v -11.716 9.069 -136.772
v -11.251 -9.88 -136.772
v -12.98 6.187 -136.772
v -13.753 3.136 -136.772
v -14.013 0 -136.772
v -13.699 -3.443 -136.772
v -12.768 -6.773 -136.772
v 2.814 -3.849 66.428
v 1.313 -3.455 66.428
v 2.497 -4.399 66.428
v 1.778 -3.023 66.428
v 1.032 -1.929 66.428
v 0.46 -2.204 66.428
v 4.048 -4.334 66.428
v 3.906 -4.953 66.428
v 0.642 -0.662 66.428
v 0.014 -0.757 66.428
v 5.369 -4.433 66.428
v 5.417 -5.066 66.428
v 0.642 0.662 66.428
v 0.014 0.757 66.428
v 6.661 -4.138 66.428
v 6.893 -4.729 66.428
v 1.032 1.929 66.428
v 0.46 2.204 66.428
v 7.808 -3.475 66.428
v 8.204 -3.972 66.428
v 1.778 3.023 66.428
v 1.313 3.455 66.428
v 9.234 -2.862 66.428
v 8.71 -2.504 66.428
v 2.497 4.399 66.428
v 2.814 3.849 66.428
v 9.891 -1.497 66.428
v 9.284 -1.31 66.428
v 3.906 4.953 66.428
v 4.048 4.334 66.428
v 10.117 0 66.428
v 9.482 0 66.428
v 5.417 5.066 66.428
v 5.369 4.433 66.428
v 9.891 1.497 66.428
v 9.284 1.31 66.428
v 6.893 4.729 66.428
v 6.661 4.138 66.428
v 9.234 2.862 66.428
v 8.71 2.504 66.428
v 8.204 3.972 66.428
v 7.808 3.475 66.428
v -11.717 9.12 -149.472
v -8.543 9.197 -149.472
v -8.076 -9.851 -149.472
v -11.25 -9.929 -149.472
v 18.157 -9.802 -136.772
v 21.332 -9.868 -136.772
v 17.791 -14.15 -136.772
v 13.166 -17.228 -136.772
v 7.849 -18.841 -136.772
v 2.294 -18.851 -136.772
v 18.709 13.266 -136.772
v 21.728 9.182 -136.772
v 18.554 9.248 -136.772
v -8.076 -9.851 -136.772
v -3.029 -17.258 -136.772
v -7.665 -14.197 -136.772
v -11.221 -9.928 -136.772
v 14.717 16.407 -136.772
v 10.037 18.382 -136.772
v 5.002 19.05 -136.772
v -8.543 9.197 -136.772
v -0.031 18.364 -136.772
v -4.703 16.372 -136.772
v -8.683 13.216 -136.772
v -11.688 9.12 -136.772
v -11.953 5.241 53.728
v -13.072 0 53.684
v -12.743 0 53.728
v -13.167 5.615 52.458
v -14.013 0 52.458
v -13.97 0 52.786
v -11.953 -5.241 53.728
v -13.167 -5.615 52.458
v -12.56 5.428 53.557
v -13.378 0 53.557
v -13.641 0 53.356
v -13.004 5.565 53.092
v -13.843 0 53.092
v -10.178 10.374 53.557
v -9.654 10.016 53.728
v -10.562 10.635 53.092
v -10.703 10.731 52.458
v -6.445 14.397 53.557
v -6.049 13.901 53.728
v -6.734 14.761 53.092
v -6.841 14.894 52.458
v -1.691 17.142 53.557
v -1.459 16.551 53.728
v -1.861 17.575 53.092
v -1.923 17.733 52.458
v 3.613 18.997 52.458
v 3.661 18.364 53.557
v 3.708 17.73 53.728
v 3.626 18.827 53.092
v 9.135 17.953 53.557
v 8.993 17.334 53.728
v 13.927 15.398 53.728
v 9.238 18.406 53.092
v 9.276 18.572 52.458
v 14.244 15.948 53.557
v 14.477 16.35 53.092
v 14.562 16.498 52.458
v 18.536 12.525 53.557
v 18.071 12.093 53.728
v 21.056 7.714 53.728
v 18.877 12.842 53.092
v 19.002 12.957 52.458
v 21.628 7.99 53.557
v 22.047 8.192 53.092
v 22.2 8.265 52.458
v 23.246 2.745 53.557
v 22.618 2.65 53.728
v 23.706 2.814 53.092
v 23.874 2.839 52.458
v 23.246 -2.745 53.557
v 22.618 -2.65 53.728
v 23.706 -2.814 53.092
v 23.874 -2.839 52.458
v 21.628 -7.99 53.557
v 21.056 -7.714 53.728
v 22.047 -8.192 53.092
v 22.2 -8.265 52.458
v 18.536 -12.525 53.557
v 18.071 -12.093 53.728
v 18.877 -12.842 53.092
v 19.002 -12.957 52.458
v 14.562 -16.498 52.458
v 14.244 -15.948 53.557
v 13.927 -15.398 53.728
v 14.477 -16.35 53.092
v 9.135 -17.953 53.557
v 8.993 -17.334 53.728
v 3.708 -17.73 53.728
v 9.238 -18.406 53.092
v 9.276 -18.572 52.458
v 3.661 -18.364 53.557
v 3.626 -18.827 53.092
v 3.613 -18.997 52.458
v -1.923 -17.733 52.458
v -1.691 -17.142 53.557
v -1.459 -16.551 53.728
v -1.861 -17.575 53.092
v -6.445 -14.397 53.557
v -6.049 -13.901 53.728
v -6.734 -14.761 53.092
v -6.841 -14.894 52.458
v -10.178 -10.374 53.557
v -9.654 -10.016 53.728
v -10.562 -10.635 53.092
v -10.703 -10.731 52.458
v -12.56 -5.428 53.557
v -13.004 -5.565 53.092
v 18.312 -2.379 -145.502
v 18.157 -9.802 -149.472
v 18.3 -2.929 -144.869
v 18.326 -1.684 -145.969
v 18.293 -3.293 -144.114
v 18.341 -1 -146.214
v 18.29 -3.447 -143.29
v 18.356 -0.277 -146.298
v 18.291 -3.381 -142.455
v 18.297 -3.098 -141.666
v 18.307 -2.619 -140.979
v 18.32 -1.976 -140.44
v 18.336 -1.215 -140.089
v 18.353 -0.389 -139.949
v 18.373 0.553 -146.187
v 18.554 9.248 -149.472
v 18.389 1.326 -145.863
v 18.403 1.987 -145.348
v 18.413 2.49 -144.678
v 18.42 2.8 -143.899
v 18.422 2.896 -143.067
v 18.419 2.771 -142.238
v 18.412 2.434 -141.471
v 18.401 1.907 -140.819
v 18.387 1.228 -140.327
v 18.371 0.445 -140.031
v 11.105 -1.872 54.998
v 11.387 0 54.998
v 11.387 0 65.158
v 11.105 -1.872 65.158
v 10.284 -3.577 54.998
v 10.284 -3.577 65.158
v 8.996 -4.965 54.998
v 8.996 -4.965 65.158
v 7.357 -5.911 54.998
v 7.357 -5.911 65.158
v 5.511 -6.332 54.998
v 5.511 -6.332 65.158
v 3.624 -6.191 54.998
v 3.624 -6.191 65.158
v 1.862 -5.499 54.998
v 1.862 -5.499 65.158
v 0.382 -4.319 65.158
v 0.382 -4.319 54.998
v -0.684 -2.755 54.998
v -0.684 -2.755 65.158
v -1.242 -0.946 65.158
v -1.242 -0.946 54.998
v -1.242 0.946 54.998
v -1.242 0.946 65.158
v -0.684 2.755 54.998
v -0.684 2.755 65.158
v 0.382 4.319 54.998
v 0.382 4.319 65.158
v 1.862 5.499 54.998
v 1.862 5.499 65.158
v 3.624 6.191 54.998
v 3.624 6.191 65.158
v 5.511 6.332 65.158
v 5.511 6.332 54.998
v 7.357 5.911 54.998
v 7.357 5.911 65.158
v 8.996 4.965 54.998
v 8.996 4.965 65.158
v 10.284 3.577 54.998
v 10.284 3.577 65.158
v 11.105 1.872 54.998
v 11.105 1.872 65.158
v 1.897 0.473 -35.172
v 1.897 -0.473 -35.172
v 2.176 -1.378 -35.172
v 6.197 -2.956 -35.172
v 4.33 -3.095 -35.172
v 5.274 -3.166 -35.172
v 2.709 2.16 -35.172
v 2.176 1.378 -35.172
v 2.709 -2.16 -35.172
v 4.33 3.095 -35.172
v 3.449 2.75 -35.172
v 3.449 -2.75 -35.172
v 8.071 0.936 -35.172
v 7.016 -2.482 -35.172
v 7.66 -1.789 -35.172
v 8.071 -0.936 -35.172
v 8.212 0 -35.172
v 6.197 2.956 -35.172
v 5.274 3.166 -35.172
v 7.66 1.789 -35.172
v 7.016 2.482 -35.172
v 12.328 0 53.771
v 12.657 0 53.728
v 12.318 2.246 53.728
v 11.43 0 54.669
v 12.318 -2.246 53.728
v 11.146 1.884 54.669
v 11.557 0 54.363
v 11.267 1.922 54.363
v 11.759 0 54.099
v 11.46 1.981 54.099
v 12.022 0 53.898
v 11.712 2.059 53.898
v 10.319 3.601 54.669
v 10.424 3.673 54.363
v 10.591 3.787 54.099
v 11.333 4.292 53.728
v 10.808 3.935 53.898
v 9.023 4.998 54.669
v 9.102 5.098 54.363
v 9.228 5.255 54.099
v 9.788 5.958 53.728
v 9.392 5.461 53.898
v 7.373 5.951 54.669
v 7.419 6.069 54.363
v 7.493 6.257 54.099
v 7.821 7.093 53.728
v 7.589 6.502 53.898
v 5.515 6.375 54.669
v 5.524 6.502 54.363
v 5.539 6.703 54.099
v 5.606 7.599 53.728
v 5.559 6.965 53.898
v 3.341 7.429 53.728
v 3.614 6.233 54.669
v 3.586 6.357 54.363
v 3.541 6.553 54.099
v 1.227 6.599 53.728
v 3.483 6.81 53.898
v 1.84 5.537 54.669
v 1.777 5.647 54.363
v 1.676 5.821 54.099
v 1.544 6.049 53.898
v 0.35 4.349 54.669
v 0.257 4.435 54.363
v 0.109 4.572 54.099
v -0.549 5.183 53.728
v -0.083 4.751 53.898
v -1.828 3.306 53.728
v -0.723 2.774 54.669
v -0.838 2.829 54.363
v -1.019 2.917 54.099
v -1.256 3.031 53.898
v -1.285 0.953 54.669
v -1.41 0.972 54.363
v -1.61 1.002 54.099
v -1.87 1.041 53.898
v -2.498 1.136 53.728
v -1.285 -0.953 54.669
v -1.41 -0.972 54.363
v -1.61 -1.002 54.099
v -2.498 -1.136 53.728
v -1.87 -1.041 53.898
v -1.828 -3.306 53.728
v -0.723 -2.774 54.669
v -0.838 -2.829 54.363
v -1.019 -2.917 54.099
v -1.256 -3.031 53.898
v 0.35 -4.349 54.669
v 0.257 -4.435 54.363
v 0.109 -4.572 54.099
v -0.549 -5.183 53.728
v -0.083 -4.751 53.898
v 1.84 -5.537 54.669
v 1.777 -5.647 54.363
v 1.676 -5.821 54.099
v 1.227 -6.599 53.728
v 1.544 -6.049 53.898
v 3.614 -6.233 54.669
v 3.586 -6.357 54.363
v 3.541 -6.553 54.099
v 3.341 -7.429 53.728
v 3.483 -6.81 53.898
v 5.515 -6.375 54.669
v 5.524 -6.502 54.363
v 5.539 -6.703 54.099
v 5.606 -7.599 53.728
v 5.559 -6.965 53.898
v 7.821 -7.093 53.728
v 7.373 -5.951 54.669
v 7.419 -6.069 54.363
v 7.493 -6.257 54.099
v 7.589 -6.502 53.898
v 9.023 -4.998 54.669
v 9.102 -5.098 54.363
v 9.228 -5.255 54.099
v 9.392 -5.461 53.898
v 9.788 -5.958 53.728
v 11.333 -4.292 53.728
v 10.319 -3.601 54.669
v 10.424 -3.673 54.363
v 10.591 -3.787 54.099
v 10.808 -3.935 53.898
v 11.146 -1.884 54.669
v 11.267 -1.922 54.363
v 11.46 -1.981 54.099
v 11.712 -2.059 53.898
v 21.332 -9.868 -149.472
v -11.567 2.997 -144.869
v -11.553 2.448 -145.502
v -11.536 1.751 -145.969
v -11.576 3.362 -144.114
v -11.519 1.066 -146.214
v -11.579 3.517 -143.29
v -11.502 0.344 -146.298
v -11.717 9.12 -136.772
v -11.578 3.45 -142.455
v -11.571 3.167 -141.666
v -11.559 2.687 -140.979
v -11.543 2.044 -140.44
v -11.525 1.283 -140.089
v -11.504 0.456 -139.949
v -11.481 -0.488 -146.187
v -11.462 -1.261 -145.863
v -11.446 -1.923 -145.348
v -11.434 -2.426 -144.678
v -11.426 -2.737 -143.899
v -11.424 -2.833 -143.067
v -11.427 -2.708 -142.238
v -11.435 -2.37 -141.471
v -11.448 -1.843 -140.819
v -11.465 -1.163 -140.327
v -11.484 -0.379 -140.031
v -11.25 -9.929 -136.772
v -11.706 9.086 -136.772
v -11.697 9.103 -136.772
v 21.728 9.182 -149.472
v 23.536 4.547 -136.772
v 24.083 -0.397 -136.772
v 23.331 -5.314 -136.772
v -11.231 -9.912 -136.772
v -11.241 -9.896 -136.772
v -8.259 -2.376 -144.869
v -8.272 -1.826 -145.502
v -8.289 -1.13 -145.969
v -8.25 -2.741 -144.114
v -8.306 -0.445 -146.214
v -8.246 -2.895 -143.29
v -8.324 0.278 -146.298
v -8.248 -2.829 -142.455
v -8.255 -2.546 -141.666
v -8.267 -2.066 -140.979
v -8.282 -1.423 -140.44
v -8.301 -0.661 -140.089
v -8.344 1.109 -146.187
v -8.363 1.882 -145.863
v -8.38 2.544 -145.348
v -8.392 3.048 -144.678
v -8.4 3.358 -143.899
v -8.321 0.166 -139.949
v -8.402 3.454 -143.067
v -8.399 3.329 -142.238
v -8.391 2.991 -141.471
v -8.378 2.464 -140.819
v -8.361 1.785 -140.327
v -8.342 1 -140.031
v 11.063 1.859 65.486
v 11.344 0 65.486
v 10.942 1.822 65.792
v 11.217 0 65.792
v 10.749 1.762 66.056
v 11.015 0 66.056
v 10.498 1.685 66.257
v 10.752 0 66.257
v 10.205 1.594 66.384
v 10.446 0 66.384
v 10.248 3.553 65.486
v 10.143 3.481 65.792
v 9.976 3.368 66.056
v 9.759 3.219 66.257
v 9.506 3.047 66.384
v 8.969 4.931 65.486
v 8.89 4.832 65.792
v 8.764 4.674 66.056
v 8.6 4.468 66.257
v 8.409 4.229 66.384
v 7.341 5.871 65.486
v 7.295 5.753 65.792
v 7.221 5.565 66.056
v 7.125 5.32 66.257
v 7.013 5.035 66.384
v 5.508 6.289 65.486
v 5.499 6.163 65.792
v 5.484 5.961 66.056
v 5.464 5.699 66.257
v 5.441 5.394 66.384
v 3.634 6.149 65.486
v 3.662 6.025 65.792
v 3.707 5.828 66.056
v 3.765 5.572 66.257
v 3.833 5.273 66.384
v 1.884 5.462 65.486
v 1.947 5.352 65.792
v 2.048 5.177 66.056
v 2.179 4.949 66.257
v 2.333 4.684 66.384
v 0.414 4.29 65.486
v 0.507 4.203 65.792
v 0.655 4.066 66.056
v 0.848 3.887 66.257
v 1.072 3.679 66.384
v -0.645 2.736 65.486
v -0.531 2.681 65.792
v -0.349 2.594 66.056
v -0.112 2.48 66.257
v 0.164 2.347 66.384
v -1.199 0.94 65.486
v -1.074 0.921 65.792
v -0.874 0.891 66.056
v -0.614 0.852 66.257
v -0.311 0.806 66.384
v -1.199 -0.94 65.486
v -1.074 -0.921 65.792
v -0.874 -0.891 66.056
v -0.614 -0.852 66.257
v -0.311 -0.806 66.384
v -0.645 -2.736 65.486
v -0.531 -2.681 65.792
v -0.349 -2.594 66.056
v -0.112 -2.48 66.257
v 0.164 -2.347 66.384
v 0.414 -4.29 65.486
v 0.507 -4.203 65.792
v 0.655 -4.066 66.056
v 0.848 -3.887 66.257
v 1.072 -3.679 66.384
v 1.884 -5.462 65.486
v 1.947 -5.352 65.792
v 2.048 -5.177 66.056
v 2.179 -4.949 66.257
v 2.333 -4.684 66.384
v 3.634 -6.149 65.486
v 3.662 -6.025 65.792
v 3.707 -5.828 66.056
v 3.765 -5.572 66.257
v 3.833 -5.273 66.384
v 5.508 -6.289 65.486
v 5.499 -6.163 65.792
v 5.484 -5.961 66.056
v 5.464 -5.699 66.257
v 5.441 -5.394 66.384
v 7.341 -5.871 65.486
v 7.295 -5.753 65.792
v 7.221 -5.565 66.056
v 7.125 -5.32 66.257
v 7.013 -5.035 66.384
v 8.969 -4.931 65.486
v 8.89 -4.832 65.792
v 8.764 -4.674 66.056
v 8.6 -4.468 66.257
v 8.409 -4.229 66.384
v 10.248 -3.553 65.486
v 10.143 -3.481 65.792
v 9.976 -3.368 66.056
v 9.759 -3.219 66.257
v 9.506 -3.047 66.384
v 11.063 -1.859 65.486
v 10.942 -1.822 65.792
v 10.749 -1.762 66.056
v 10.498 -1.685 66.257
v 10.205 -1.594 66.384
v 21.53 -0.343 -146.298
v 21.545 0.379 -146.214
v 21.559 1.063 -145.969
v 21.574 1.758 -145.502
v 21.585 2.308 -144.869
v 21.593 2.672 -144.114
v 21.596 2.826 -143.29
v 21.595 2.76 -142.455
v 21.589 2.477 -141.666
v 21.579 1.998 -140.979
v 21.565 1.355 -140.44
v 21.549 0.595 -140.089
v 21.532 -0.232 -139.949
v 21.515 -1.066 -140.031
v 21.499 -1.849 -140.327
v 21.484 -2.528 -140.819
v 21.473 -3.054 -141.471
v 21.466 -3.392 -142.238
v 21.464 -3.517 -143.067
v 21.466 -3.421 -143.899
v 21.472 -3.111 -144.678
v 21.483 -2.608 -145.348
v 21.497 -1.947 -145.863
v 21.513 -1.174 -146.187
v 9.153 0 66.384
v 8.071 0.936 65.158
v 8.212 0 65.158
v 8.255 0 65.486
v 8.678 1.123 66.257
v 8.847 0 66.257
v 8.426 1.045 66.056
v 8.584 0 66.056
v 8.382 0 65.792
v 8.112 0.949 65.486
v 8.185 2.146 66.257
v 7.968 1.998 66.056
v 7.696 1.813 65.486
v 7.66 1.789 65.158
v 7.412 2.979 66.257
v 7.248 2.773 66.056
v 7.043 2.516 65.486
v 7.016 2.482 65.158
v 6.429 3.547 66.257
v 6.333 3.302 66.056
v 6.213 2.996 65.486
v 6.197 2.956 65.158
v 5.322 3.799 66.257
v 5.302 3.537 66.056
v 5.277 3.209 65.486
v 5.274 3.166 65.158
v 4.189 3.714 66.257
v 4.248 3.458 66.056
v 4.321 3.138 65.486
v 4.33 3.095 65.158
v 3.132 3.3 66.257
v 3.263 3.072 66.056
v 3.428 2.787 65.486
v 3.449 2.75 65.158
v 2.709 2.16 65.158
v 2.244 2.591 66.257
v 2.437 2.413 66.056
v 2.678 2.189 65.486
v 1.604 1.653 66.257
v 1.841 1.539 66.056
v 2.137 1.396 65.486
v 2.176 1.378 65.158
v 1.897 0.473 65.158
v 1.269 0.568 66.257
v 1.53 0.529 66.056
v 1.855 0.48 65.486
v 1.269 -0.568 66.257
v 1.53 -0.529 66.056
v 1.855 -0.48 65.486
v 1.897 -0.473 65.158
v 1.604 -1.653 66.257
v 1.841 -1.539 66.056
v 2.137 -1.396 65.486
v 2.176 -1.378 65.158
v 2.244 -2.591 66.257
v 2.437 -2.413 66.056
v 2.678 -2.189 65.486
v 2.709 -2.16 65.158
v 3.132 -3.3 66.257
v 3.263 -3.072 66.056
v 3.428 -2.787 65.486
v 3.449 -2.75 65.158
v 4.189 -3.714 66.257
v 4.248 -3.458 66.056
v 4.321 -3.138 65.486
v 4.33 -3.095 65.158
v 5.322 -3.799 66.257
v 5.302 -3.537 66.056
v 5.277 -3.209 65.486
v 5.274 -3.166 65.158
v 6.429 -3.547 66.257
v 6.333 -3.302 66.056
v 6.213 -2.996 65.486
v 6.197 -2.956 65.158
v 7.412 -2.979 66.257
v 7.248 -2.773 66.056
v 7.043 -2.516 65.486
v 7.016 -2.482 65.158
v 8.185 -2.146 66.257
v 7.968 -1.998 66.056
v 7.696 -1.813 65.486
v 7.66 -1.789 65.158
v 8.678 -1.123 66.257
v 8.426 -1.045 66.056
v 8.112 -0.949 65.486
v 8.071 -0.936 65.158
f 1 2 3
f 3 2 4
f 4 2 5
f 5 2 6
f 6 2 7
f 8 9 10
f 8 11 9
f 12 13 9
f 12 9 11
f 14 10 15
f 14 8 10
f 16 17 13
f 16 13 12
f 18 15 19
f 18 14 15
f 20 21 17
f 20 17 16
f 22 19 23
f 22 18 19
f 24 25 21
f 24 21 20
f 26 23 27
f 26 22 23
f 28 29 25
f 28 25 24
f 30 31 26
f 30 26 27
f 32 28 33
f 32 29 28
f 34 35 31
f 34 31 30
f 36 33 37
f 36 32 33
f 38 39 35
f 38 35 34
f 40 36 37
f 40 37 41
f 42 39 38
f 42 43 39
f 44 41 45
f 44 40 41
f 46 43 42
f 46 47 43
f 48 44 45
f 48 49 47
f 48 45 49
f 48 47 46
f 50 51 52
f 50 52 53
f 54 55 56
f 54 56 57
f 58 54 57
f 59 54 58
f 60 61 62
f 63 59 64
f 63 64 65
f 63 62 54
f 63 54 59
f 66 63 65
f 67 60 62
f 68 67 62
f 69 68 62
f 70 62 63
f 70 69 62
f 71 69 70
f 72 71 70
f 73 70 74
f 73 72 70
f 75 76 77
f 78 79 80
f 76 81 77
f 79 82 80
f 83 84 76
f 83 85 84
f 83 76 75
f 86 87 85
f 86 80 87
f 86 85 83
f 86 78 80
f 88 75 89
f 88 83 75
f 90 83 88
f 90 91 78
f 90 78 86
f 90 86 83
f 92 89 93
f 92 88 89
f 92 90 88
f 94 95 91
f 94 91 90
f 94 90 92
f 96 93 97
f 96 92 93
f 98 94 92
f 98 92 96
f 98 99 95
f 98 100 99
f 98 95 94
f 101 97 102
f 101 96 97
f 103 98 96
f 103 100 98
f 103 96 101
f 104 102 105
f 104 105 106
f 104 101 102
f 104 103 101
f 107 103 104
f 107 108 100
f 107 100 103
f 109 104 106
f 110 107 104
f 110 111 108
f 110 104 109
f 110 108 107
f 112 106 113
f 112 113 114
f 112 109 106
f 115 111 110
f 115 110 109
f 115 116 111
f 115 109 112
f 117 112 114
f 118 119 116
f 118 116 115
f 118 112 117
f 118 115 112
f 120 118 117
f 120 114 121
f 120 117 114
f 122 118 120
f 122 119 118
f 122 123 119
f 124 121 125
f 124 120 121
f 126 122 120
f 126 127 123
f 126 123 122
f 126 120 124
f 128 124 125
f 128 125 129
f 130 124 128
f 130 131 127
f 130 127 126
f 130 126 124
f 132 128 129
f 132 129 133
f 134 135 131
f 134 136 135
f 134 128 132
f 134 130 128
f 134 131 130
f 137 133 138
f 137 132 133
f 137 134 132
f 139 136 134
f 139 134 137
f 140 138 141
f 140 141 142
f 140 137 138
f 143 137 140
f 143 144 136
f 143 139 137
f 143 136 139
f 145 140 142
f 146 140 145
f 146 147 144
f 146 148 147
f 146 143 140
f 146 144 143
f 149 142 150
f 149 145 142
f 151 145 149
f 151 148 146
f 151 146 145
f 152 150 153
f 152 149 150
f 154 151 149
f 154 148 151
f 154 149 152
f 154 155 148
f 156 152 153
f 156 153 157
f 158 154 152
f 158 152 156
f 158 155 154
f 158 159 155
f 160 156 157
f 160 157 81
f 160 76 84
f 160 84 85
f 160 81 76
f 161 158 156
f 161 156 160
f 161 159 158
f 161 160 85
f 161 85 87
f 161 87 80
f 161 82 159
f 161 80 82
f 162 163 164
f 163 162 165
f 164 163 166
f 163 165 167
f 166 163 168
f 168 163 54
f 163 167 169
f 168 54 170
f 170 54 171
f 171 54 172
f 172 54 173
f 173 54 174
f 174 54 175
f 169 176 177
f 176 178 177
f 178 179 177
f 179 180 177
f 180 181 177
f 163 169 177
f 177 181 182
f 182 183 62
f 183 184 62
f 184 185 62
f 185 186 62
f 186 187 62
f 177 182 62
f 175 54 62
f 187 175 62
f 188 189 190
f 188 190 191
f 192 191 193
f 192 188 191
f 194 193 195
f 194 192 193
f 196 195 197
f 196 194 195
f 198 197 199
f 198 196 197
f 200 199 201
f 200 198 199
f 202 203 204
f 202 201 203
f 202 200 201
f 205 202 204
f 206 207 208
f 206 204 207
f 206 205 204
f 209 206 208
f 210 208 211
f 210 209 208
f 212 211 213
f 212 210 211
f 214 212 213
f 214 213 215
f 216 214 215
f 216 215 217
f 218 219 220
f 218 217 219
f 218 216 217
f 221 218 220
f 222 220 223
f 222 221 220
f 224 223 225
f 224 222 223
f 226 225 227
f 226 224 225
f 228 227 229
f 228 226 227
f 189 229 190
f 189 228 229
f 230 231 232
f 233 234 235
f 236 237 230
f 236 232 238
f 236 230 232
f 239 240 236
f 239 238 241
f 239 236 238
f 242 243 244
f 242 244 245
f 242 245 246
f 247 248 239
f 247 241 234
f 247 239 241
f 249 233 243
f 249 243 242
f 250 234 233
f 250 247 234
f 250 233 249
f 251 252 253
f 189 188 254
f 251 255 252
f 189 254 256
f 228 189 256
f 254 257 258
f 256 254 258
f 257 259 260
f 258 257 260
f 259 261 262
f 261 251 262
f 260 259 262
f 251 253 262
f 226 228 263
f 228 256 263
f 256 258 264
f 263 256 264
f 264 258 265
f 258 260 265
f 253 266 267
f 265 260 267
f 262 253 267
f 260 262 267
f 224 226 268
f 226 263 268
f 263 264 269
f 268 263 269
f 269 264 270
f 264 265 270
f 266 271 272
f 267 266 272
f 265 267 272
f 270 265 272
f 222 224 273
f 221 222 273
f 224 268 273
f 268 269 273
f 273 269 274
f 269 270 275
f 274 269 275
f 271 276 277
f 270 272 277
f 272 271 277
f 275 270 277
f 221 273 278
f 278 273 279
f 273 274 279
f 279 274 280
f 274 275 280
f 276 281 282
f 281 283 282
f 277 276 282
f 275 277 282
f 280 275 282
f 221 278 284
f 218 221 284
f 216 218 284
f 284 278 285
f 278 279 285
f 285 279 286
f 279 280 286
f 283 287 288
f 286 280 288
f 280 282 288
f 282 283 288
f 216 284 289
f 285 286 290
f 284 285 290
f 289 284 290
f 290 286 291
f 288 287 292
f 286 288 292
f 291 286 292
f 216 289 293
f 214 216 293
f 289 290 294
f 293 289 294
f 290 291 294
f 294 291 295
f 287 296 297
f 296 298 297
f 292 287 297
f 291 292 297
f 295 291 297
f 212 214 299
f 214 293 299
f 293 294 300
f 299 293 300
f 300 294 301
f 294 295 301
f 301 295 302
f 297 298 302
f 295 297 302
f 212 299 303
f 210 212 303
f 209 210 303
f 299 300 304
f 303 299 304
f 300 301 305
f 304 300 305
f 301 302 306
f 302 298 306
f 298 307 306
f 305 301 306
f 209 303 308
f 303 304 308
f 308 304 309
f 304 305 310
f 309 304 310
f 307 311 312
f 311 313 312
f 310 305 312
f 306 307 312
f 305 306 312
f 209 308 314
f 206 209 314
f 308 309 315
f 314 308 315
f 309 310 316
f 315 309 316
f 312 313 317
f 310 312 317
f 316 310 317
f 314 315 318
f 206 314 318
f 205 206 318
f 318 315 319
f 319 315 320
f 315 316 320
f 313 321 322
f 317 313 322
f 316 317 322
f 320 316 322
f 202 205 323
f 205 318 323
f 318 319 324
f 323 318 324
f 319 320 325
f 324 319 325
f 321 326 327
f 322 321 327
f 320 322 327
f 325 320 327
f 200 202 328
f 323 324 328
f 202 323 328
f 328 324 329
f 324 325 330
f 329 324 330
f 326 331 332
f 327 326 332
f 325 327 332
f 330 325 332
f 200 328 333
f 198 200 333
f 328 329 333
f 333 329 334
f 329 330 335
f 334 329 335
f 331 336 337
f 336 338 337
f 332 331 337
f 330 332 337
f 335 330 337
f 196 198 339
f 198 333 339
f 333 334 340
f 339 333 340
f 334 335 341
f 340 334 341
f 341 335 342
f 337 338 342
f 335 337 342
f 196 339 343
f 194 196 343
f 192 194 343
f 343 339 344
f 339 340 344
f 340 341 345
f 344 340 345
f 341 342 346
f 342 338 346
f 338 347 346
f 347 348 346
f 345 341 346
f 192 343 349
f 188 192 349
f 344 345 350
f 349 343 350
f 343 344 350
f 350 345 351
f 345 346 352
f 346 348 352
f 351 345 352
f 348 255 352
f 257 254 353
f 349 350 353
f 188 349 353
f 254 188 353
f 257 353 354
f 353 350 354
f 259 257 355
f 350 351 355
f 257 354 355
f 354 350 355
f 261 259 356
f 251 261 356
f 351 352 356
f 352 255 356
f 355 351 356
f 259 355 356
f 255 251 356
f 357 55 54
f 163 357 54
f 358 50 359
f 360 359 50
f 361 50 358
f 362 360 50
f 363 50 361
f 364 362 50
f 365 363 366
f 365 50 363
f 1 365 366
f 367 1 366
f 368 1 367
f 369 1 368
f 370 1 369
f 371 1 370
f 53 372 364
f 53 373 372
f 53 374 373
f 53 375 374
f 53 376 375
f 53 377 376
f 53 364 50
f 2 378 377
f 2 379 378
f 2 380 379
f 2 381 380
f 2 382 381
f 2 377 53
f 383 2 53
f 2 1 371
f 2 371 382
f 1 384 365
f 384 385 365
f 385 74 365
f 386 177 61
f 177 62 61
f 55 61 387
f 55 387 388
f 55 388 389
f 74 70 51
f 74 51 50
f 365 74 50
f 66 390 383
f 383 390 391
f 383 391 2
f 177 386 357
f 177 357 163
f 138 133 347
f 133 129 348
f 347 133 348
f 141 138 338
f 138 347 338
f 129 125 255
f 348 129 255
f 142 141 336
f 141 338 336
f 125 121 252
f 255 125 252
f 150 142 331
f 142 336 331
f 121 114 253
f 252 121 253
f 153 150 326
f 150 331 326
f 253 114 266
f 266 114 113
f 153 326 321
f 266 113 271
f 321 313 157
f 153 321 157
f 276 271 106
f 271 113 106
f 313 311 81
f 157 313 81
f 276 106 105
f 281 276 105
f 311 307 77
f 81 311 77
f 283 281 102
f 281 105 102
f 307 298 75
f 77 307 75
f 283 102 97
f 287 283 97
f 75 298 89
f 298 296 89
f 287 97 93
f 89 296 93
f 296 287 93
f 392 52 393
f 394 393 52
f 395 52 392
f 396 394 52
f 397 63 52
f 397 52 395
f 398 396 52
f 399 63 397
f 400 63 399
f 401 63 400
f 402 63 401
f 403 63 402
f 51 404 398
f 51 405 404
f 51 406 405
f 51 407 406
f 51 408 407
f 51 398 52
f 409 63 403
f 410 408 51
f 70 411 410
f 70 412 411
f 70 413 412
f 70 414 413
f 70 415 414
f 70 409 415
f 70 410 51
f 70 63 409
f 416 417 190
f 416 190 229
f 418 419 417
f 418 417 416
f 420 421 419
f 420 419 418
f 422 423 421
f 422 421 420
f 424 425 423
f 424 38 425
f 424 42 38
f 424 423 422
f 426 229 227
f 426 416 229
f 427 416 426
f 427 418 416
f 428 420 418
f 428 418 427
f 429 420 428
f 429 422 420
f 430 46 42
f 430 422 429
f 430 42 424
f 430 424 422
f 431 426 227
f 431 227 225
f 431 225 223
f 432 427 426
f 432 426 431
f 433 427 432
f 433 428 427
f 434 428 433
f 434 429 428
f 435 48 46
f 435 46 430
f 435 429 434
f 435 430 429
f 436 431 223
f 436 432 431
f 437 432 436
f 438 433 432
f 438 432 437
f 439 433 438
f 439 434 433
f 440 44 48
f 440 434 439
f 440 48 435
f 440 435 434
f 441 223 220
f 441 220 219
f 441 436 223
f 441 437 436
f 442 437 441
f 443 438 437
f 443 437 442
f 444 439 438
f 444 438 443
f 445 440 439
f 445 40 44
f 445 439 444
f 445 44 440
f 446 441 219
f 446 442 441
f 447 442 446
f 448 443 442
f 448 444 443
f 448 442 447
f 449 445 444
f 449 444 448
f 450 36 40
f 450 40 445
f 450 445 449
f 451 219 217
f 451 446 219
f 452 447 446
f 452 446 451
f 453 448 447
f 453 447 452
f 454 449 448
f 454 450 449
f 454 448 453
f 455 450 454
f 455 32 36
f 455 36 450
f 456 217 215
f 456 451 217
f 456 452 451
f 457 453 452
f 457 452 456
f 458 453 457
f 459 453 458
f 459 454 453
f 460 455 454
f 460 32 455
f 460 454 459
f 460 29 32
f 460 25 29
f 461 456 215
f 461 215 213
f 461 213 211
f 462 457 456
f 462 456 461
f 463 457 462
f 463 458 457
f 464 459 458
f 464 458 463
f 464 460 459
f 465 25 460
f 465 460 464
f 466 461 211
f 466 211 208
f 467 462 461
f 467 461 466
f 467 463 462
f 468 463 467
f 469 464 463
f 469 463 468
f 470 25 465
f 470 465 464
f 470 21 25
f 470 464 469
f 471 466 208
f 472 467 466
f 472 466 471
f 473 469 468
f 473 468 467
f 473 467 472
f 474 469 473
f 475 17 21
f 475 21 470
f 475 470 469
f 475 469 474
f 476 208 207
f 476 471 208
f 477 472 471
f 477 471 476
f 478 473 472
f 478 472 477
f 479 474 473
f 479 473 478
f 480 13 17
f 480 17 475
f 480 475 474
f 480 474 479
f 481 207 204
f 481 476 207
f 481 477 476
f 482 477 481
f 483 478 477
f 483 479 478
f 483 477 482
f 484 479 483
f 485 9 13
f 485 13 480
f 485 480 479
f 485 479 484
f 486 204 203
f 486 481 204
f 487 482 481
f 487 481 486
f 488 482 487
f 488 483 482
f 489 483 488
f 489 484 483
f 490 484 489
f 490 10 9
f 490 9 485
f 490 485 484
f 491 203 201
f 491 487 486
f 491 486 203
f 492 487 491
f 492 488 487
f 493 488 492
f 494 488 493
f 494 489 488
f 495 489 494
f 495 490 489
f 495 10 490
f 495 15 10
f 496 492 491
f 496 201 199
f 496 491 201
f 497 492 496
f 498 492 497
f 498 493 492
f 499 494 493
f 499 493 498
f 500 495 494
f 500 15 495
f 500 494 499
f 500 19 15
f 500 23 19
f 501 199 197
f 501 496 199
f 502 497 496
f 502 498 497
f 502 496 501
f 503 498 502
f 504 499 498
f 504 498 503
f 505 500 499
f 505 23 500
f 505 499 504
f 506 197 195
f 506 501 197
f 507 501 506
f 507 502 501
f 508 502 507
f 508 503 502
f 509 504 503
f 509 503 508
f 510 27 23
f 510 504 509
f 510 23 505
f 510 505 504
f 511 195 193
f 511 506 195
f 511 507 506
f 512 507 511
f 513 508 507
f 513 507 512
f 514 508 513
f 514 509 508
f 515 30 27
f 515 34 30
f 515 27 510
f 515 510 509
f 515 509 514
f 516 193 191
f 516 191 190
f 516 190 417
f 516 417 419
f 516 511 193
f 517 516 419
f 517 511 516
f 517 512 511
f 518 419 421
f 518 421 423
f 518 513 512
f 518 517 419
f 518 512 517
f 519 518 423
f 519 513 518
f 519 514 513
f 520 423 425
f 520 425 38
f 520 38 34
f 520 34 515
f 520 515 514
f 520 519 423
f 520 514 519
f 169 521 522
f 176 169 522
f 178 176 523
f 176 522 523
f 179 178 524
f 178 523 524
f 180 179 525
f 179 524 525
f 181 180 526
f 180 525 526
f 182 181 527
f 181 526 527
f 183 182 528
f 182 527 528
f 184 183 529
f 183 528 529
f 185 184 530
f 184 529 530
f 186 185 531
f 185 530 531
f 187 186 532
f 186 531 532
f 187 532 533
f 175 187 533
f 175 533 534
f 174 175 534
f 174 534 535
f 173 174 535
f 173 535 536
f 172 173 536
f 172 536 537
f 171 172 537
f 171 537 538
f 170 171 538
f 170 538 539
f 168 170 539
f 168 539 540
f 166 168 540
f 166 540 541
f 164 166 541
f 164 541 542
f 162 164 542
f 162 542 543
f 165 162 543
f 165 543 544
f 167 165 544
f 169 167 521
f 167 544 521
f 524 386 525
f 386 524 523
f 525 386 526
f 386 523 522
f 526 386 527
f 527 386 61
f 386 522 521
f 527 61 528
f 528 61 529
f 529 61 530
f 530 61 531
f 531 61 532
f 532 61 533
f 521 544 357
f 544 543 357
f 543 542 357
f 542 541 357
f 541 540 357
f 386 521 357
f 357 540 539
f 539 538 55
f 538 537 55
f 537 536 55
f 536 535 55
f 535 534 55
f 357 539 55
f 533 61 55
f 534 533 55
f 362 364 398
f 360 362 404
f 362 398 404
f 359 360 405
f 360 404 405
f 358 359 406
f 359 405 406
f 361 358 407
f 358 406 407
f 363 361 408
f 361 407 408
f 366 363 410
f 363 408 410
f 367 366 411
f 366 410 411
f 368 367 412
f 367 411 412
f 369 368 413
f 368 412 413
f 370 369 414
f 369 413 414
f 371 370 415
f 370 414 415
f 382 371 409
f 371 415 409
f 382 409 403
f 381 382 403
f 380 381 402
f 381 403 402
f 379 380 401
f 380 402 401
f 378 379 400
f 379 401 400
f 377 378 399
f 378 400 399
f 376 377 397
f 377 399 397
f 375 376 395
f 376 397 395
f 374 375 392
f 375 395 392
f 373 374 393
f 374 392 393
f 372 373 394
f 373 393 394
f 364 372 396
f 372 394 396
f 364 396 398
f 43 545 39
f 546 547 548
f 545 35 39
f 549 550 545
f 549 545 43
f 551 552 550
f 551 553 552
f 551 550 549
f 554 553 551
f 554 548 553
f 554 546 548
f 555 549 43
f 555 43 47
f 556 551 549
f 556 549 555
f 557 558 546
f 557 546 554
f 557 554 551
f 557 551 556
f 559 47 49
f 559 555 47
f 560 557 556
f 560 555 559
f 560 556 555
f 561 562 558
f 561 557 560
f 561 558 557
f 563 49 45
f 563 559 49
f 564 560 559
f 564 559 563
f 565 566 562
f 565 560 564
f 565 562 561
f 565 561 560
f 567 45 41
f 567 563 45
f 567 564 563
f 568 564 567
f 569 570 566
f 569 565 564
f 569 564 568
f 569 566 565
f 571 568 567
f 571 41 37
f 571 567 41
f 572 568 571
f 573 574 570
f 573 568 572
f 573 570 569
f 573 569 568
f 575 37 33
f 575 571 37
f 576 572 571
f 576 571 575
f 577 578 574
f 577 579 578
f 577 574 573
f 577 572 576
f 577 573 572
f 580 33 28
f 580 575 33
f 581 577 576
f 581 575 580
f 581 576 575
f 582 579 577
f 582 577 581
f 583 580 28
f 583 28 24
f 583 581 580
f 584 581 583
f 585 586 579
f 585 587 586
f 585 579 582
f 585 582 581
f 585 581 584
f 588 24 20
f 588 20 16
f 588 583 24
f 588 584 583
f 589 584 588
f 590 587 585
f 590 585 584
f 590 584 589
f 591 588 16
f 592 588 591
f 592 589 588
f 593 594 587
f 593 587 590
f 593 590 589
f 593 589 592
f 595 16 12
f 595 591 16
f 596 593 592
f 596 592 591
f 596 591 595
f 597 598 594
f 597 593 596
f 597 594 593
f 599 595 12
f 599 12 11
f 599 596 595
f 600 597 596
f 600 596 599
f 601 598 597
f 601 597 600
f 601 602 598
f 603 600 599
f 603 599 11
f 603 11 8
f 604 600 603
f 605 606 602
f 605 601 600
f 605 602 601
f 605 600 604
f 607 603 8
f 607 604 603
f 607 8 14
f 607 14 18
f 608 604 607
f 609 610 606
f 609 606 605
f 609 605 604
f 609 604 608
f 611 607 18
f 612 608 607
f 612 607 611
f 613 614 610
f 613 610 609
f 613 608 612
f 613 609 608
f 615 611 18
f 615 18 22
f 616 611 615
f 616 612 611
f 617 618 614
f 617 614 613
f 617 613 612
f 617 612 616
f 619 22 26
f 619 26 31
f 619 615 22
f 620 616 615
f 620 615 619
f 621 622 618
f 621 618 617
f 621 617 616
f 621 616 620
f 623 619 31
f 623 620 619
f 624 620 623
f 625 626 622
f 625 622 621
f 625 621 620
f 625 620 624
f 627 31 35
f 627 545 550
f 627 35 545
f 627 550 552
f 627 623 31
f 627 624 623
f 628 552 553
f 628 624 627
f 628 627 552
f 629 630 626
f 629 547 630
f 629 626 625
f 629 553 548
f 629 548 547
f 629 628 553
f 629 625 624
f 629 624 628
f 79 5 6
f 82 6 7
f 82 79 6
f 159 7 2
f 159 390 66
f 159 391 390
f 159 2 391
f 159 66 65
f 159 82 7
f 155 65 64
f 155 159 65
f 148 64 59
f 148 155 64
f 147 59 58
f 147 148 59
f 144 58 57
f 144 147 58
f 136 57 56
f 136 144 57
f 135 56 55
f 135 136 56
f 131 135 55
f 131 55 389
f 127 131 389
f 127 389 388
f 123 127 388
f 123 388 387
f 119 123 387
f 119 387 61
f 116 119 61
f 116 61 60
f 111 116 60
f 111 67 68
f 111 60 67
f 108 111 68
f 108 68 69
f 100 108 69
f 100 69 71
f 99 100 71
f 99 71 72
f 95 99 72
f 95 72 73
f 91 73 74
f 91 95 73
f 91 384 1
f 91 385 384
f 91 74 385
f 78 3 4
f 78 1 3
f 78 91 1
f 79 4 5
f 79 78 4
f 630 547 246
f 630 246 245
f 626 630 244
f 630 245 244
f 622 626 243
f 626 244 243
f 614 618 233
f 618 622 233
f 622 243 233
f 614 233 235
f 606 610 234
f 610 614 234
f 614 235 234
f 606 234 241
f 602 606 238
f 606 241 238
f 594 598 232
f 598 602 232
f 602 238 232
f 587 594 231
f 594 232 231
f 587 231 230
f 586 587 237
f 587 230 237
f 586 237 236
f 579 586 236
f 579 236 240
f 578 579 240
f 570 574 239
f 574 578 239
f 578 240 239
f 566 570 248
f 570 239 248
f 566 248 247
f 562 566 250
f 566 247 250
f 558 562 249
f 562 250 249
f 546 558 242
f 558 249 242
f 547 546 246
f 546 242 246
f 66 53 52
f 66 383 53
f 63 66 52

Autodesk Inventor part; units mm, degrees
ref_plane "YZ Plane" through (0, 0, 0) normal (1, 0, 0) x (0, 1, 0)
ref_plane "XZ Plane" through (0, 0, 0) normal (0, 1, 0) x (-1, 0, 0)
ref_plane "XY Plane" through (0, 0, 0) normal (0, 0, 1) x (1, 0, 0)
sketch "Sketch1" plane through (0, 0, 0) normal (0, 1, 0) x (-1, 0, 0)
  line L0 (14.0131, 53.7275) -> (-24.0869, 53.7275)
  line L1 (-24.0869, 53.7275) -> (-24.0869, -136.7725)
  line L2 (-24.0869, -136.7725) -> (14.0131, -136.7725)
  line L3 (14.0131, -136.7725) -> (14.0131, 53.7275)
  line L4 (-5.0369, 53.7275) -> (-5.0369, -136.7725)
  point P0 (0, 0)
  dimension "d0" = 38.1
  dimension "d1" = 190.5
revolve "Revolution1" add sketch "Sketch1" angle 360 about axis through (5.0369, 0, 53.7275) along (0, 0, -1) contours L3 L2 L4 L0
sketch "Sketch2" plane through (5.0369, 0, 53.7275) normal (0, 0, 1) x (1, 0, 0)
  circle A0 centre (0, 0) radius 3.175
  point P0 (-5.0369, 0)
  dimension "d3" = 6.35
extrude "Extrusion1" cut sketch "Sketch2" against normal blind 88.9
sketch "Sketch3" plane through (5.0369, 0, -136.7725) normal (0, 0, -1) x (-1, 0, 0)
  circle A0 centre (0, 0) radius 3.175 projected
  circle A1 centre (0, 0) radius 19.05
  circle A2 centre (0, 0) radius 19.05 projected
  line L0 (-16.6914, 9.1815) -> (-16.2946, -9.8685)
  line L1 (-16.2946, -9.8685) -> (-13.1203, -9.8024)
  line L2 (-13.1203, -9.8024) -> (-13.5171, 9.2476)
  line L3 (-13.5171, 9.2476) -> (-16.6914, 9.1815)
  line L4 (0.0496, 19.0499) -> (-0.0211, -19.05)
  line L5 (16.7538, 9.1195) -> (16.2864, -9.9289)
  line L6 (16.2864, -9.9289) -> (13.1124, -9.851)
  line L7 (13.1124, -9.851) -> (13.5798, 9.1974)
  line L8 (13.5798, 9.1974) -> (16.7538, 9.1195)
  point P0 (5.0369, 0)
  dimension "d6" = 3.175
  dimension "d7" = 19.05
extrude "Extrusion2" add sketch "Sketch3" along normal blind 12.7 contours L3 L2 L1 L0 | L8 L5 A1 | A1 L5 L6 L7 L8 | A1 L5 L6
sketch "Sketch4" plane through (21.3316, -9.8685, -136.7725) normal (0.9998, -0.0208, 0) x (0, 0, -1)
  line L0 (12.7, 19.0541) -> (0, 19.0541)
  line L1 (0, 19.0541) -> (0, 0)
  line L2 (0, 0) -> (12.7, 0)
  line L3 (12.7, 0) -> (12.7, 19.0541)
  circle A0 centre (6.35, 9.5271) radius 3.175
  point P0 (-136.7725, 9.4222)
  dimension "d10" = 6.35
extrude "Extrusion3" cut sketch "Sketch4" against normal blind 3149.6 contours A0
sketch "Sketch5" plane through (5.0369, 0, 53.7275) normal (0, 0, 1) x (1, 0, 0)
  circle A0 centre (0, 0) radius 3.175
  circle A1 centre (0, 0) radius 6.35
  point P0 (-5.0369, 0)
  dimension "d13" = 12.7
extrude "Extrusion4" add sketch "Sketch5" along normal blind 12.7
fillet "Fillet1" radius 1.27 4 edges at (-1.3131, 0, 66.4275) (24.0869, 0, 53.7275) (-1.3131, 0, 53.7275) (1.8619, 0, 66.4275)
properties part number "PC3.5-P1"
